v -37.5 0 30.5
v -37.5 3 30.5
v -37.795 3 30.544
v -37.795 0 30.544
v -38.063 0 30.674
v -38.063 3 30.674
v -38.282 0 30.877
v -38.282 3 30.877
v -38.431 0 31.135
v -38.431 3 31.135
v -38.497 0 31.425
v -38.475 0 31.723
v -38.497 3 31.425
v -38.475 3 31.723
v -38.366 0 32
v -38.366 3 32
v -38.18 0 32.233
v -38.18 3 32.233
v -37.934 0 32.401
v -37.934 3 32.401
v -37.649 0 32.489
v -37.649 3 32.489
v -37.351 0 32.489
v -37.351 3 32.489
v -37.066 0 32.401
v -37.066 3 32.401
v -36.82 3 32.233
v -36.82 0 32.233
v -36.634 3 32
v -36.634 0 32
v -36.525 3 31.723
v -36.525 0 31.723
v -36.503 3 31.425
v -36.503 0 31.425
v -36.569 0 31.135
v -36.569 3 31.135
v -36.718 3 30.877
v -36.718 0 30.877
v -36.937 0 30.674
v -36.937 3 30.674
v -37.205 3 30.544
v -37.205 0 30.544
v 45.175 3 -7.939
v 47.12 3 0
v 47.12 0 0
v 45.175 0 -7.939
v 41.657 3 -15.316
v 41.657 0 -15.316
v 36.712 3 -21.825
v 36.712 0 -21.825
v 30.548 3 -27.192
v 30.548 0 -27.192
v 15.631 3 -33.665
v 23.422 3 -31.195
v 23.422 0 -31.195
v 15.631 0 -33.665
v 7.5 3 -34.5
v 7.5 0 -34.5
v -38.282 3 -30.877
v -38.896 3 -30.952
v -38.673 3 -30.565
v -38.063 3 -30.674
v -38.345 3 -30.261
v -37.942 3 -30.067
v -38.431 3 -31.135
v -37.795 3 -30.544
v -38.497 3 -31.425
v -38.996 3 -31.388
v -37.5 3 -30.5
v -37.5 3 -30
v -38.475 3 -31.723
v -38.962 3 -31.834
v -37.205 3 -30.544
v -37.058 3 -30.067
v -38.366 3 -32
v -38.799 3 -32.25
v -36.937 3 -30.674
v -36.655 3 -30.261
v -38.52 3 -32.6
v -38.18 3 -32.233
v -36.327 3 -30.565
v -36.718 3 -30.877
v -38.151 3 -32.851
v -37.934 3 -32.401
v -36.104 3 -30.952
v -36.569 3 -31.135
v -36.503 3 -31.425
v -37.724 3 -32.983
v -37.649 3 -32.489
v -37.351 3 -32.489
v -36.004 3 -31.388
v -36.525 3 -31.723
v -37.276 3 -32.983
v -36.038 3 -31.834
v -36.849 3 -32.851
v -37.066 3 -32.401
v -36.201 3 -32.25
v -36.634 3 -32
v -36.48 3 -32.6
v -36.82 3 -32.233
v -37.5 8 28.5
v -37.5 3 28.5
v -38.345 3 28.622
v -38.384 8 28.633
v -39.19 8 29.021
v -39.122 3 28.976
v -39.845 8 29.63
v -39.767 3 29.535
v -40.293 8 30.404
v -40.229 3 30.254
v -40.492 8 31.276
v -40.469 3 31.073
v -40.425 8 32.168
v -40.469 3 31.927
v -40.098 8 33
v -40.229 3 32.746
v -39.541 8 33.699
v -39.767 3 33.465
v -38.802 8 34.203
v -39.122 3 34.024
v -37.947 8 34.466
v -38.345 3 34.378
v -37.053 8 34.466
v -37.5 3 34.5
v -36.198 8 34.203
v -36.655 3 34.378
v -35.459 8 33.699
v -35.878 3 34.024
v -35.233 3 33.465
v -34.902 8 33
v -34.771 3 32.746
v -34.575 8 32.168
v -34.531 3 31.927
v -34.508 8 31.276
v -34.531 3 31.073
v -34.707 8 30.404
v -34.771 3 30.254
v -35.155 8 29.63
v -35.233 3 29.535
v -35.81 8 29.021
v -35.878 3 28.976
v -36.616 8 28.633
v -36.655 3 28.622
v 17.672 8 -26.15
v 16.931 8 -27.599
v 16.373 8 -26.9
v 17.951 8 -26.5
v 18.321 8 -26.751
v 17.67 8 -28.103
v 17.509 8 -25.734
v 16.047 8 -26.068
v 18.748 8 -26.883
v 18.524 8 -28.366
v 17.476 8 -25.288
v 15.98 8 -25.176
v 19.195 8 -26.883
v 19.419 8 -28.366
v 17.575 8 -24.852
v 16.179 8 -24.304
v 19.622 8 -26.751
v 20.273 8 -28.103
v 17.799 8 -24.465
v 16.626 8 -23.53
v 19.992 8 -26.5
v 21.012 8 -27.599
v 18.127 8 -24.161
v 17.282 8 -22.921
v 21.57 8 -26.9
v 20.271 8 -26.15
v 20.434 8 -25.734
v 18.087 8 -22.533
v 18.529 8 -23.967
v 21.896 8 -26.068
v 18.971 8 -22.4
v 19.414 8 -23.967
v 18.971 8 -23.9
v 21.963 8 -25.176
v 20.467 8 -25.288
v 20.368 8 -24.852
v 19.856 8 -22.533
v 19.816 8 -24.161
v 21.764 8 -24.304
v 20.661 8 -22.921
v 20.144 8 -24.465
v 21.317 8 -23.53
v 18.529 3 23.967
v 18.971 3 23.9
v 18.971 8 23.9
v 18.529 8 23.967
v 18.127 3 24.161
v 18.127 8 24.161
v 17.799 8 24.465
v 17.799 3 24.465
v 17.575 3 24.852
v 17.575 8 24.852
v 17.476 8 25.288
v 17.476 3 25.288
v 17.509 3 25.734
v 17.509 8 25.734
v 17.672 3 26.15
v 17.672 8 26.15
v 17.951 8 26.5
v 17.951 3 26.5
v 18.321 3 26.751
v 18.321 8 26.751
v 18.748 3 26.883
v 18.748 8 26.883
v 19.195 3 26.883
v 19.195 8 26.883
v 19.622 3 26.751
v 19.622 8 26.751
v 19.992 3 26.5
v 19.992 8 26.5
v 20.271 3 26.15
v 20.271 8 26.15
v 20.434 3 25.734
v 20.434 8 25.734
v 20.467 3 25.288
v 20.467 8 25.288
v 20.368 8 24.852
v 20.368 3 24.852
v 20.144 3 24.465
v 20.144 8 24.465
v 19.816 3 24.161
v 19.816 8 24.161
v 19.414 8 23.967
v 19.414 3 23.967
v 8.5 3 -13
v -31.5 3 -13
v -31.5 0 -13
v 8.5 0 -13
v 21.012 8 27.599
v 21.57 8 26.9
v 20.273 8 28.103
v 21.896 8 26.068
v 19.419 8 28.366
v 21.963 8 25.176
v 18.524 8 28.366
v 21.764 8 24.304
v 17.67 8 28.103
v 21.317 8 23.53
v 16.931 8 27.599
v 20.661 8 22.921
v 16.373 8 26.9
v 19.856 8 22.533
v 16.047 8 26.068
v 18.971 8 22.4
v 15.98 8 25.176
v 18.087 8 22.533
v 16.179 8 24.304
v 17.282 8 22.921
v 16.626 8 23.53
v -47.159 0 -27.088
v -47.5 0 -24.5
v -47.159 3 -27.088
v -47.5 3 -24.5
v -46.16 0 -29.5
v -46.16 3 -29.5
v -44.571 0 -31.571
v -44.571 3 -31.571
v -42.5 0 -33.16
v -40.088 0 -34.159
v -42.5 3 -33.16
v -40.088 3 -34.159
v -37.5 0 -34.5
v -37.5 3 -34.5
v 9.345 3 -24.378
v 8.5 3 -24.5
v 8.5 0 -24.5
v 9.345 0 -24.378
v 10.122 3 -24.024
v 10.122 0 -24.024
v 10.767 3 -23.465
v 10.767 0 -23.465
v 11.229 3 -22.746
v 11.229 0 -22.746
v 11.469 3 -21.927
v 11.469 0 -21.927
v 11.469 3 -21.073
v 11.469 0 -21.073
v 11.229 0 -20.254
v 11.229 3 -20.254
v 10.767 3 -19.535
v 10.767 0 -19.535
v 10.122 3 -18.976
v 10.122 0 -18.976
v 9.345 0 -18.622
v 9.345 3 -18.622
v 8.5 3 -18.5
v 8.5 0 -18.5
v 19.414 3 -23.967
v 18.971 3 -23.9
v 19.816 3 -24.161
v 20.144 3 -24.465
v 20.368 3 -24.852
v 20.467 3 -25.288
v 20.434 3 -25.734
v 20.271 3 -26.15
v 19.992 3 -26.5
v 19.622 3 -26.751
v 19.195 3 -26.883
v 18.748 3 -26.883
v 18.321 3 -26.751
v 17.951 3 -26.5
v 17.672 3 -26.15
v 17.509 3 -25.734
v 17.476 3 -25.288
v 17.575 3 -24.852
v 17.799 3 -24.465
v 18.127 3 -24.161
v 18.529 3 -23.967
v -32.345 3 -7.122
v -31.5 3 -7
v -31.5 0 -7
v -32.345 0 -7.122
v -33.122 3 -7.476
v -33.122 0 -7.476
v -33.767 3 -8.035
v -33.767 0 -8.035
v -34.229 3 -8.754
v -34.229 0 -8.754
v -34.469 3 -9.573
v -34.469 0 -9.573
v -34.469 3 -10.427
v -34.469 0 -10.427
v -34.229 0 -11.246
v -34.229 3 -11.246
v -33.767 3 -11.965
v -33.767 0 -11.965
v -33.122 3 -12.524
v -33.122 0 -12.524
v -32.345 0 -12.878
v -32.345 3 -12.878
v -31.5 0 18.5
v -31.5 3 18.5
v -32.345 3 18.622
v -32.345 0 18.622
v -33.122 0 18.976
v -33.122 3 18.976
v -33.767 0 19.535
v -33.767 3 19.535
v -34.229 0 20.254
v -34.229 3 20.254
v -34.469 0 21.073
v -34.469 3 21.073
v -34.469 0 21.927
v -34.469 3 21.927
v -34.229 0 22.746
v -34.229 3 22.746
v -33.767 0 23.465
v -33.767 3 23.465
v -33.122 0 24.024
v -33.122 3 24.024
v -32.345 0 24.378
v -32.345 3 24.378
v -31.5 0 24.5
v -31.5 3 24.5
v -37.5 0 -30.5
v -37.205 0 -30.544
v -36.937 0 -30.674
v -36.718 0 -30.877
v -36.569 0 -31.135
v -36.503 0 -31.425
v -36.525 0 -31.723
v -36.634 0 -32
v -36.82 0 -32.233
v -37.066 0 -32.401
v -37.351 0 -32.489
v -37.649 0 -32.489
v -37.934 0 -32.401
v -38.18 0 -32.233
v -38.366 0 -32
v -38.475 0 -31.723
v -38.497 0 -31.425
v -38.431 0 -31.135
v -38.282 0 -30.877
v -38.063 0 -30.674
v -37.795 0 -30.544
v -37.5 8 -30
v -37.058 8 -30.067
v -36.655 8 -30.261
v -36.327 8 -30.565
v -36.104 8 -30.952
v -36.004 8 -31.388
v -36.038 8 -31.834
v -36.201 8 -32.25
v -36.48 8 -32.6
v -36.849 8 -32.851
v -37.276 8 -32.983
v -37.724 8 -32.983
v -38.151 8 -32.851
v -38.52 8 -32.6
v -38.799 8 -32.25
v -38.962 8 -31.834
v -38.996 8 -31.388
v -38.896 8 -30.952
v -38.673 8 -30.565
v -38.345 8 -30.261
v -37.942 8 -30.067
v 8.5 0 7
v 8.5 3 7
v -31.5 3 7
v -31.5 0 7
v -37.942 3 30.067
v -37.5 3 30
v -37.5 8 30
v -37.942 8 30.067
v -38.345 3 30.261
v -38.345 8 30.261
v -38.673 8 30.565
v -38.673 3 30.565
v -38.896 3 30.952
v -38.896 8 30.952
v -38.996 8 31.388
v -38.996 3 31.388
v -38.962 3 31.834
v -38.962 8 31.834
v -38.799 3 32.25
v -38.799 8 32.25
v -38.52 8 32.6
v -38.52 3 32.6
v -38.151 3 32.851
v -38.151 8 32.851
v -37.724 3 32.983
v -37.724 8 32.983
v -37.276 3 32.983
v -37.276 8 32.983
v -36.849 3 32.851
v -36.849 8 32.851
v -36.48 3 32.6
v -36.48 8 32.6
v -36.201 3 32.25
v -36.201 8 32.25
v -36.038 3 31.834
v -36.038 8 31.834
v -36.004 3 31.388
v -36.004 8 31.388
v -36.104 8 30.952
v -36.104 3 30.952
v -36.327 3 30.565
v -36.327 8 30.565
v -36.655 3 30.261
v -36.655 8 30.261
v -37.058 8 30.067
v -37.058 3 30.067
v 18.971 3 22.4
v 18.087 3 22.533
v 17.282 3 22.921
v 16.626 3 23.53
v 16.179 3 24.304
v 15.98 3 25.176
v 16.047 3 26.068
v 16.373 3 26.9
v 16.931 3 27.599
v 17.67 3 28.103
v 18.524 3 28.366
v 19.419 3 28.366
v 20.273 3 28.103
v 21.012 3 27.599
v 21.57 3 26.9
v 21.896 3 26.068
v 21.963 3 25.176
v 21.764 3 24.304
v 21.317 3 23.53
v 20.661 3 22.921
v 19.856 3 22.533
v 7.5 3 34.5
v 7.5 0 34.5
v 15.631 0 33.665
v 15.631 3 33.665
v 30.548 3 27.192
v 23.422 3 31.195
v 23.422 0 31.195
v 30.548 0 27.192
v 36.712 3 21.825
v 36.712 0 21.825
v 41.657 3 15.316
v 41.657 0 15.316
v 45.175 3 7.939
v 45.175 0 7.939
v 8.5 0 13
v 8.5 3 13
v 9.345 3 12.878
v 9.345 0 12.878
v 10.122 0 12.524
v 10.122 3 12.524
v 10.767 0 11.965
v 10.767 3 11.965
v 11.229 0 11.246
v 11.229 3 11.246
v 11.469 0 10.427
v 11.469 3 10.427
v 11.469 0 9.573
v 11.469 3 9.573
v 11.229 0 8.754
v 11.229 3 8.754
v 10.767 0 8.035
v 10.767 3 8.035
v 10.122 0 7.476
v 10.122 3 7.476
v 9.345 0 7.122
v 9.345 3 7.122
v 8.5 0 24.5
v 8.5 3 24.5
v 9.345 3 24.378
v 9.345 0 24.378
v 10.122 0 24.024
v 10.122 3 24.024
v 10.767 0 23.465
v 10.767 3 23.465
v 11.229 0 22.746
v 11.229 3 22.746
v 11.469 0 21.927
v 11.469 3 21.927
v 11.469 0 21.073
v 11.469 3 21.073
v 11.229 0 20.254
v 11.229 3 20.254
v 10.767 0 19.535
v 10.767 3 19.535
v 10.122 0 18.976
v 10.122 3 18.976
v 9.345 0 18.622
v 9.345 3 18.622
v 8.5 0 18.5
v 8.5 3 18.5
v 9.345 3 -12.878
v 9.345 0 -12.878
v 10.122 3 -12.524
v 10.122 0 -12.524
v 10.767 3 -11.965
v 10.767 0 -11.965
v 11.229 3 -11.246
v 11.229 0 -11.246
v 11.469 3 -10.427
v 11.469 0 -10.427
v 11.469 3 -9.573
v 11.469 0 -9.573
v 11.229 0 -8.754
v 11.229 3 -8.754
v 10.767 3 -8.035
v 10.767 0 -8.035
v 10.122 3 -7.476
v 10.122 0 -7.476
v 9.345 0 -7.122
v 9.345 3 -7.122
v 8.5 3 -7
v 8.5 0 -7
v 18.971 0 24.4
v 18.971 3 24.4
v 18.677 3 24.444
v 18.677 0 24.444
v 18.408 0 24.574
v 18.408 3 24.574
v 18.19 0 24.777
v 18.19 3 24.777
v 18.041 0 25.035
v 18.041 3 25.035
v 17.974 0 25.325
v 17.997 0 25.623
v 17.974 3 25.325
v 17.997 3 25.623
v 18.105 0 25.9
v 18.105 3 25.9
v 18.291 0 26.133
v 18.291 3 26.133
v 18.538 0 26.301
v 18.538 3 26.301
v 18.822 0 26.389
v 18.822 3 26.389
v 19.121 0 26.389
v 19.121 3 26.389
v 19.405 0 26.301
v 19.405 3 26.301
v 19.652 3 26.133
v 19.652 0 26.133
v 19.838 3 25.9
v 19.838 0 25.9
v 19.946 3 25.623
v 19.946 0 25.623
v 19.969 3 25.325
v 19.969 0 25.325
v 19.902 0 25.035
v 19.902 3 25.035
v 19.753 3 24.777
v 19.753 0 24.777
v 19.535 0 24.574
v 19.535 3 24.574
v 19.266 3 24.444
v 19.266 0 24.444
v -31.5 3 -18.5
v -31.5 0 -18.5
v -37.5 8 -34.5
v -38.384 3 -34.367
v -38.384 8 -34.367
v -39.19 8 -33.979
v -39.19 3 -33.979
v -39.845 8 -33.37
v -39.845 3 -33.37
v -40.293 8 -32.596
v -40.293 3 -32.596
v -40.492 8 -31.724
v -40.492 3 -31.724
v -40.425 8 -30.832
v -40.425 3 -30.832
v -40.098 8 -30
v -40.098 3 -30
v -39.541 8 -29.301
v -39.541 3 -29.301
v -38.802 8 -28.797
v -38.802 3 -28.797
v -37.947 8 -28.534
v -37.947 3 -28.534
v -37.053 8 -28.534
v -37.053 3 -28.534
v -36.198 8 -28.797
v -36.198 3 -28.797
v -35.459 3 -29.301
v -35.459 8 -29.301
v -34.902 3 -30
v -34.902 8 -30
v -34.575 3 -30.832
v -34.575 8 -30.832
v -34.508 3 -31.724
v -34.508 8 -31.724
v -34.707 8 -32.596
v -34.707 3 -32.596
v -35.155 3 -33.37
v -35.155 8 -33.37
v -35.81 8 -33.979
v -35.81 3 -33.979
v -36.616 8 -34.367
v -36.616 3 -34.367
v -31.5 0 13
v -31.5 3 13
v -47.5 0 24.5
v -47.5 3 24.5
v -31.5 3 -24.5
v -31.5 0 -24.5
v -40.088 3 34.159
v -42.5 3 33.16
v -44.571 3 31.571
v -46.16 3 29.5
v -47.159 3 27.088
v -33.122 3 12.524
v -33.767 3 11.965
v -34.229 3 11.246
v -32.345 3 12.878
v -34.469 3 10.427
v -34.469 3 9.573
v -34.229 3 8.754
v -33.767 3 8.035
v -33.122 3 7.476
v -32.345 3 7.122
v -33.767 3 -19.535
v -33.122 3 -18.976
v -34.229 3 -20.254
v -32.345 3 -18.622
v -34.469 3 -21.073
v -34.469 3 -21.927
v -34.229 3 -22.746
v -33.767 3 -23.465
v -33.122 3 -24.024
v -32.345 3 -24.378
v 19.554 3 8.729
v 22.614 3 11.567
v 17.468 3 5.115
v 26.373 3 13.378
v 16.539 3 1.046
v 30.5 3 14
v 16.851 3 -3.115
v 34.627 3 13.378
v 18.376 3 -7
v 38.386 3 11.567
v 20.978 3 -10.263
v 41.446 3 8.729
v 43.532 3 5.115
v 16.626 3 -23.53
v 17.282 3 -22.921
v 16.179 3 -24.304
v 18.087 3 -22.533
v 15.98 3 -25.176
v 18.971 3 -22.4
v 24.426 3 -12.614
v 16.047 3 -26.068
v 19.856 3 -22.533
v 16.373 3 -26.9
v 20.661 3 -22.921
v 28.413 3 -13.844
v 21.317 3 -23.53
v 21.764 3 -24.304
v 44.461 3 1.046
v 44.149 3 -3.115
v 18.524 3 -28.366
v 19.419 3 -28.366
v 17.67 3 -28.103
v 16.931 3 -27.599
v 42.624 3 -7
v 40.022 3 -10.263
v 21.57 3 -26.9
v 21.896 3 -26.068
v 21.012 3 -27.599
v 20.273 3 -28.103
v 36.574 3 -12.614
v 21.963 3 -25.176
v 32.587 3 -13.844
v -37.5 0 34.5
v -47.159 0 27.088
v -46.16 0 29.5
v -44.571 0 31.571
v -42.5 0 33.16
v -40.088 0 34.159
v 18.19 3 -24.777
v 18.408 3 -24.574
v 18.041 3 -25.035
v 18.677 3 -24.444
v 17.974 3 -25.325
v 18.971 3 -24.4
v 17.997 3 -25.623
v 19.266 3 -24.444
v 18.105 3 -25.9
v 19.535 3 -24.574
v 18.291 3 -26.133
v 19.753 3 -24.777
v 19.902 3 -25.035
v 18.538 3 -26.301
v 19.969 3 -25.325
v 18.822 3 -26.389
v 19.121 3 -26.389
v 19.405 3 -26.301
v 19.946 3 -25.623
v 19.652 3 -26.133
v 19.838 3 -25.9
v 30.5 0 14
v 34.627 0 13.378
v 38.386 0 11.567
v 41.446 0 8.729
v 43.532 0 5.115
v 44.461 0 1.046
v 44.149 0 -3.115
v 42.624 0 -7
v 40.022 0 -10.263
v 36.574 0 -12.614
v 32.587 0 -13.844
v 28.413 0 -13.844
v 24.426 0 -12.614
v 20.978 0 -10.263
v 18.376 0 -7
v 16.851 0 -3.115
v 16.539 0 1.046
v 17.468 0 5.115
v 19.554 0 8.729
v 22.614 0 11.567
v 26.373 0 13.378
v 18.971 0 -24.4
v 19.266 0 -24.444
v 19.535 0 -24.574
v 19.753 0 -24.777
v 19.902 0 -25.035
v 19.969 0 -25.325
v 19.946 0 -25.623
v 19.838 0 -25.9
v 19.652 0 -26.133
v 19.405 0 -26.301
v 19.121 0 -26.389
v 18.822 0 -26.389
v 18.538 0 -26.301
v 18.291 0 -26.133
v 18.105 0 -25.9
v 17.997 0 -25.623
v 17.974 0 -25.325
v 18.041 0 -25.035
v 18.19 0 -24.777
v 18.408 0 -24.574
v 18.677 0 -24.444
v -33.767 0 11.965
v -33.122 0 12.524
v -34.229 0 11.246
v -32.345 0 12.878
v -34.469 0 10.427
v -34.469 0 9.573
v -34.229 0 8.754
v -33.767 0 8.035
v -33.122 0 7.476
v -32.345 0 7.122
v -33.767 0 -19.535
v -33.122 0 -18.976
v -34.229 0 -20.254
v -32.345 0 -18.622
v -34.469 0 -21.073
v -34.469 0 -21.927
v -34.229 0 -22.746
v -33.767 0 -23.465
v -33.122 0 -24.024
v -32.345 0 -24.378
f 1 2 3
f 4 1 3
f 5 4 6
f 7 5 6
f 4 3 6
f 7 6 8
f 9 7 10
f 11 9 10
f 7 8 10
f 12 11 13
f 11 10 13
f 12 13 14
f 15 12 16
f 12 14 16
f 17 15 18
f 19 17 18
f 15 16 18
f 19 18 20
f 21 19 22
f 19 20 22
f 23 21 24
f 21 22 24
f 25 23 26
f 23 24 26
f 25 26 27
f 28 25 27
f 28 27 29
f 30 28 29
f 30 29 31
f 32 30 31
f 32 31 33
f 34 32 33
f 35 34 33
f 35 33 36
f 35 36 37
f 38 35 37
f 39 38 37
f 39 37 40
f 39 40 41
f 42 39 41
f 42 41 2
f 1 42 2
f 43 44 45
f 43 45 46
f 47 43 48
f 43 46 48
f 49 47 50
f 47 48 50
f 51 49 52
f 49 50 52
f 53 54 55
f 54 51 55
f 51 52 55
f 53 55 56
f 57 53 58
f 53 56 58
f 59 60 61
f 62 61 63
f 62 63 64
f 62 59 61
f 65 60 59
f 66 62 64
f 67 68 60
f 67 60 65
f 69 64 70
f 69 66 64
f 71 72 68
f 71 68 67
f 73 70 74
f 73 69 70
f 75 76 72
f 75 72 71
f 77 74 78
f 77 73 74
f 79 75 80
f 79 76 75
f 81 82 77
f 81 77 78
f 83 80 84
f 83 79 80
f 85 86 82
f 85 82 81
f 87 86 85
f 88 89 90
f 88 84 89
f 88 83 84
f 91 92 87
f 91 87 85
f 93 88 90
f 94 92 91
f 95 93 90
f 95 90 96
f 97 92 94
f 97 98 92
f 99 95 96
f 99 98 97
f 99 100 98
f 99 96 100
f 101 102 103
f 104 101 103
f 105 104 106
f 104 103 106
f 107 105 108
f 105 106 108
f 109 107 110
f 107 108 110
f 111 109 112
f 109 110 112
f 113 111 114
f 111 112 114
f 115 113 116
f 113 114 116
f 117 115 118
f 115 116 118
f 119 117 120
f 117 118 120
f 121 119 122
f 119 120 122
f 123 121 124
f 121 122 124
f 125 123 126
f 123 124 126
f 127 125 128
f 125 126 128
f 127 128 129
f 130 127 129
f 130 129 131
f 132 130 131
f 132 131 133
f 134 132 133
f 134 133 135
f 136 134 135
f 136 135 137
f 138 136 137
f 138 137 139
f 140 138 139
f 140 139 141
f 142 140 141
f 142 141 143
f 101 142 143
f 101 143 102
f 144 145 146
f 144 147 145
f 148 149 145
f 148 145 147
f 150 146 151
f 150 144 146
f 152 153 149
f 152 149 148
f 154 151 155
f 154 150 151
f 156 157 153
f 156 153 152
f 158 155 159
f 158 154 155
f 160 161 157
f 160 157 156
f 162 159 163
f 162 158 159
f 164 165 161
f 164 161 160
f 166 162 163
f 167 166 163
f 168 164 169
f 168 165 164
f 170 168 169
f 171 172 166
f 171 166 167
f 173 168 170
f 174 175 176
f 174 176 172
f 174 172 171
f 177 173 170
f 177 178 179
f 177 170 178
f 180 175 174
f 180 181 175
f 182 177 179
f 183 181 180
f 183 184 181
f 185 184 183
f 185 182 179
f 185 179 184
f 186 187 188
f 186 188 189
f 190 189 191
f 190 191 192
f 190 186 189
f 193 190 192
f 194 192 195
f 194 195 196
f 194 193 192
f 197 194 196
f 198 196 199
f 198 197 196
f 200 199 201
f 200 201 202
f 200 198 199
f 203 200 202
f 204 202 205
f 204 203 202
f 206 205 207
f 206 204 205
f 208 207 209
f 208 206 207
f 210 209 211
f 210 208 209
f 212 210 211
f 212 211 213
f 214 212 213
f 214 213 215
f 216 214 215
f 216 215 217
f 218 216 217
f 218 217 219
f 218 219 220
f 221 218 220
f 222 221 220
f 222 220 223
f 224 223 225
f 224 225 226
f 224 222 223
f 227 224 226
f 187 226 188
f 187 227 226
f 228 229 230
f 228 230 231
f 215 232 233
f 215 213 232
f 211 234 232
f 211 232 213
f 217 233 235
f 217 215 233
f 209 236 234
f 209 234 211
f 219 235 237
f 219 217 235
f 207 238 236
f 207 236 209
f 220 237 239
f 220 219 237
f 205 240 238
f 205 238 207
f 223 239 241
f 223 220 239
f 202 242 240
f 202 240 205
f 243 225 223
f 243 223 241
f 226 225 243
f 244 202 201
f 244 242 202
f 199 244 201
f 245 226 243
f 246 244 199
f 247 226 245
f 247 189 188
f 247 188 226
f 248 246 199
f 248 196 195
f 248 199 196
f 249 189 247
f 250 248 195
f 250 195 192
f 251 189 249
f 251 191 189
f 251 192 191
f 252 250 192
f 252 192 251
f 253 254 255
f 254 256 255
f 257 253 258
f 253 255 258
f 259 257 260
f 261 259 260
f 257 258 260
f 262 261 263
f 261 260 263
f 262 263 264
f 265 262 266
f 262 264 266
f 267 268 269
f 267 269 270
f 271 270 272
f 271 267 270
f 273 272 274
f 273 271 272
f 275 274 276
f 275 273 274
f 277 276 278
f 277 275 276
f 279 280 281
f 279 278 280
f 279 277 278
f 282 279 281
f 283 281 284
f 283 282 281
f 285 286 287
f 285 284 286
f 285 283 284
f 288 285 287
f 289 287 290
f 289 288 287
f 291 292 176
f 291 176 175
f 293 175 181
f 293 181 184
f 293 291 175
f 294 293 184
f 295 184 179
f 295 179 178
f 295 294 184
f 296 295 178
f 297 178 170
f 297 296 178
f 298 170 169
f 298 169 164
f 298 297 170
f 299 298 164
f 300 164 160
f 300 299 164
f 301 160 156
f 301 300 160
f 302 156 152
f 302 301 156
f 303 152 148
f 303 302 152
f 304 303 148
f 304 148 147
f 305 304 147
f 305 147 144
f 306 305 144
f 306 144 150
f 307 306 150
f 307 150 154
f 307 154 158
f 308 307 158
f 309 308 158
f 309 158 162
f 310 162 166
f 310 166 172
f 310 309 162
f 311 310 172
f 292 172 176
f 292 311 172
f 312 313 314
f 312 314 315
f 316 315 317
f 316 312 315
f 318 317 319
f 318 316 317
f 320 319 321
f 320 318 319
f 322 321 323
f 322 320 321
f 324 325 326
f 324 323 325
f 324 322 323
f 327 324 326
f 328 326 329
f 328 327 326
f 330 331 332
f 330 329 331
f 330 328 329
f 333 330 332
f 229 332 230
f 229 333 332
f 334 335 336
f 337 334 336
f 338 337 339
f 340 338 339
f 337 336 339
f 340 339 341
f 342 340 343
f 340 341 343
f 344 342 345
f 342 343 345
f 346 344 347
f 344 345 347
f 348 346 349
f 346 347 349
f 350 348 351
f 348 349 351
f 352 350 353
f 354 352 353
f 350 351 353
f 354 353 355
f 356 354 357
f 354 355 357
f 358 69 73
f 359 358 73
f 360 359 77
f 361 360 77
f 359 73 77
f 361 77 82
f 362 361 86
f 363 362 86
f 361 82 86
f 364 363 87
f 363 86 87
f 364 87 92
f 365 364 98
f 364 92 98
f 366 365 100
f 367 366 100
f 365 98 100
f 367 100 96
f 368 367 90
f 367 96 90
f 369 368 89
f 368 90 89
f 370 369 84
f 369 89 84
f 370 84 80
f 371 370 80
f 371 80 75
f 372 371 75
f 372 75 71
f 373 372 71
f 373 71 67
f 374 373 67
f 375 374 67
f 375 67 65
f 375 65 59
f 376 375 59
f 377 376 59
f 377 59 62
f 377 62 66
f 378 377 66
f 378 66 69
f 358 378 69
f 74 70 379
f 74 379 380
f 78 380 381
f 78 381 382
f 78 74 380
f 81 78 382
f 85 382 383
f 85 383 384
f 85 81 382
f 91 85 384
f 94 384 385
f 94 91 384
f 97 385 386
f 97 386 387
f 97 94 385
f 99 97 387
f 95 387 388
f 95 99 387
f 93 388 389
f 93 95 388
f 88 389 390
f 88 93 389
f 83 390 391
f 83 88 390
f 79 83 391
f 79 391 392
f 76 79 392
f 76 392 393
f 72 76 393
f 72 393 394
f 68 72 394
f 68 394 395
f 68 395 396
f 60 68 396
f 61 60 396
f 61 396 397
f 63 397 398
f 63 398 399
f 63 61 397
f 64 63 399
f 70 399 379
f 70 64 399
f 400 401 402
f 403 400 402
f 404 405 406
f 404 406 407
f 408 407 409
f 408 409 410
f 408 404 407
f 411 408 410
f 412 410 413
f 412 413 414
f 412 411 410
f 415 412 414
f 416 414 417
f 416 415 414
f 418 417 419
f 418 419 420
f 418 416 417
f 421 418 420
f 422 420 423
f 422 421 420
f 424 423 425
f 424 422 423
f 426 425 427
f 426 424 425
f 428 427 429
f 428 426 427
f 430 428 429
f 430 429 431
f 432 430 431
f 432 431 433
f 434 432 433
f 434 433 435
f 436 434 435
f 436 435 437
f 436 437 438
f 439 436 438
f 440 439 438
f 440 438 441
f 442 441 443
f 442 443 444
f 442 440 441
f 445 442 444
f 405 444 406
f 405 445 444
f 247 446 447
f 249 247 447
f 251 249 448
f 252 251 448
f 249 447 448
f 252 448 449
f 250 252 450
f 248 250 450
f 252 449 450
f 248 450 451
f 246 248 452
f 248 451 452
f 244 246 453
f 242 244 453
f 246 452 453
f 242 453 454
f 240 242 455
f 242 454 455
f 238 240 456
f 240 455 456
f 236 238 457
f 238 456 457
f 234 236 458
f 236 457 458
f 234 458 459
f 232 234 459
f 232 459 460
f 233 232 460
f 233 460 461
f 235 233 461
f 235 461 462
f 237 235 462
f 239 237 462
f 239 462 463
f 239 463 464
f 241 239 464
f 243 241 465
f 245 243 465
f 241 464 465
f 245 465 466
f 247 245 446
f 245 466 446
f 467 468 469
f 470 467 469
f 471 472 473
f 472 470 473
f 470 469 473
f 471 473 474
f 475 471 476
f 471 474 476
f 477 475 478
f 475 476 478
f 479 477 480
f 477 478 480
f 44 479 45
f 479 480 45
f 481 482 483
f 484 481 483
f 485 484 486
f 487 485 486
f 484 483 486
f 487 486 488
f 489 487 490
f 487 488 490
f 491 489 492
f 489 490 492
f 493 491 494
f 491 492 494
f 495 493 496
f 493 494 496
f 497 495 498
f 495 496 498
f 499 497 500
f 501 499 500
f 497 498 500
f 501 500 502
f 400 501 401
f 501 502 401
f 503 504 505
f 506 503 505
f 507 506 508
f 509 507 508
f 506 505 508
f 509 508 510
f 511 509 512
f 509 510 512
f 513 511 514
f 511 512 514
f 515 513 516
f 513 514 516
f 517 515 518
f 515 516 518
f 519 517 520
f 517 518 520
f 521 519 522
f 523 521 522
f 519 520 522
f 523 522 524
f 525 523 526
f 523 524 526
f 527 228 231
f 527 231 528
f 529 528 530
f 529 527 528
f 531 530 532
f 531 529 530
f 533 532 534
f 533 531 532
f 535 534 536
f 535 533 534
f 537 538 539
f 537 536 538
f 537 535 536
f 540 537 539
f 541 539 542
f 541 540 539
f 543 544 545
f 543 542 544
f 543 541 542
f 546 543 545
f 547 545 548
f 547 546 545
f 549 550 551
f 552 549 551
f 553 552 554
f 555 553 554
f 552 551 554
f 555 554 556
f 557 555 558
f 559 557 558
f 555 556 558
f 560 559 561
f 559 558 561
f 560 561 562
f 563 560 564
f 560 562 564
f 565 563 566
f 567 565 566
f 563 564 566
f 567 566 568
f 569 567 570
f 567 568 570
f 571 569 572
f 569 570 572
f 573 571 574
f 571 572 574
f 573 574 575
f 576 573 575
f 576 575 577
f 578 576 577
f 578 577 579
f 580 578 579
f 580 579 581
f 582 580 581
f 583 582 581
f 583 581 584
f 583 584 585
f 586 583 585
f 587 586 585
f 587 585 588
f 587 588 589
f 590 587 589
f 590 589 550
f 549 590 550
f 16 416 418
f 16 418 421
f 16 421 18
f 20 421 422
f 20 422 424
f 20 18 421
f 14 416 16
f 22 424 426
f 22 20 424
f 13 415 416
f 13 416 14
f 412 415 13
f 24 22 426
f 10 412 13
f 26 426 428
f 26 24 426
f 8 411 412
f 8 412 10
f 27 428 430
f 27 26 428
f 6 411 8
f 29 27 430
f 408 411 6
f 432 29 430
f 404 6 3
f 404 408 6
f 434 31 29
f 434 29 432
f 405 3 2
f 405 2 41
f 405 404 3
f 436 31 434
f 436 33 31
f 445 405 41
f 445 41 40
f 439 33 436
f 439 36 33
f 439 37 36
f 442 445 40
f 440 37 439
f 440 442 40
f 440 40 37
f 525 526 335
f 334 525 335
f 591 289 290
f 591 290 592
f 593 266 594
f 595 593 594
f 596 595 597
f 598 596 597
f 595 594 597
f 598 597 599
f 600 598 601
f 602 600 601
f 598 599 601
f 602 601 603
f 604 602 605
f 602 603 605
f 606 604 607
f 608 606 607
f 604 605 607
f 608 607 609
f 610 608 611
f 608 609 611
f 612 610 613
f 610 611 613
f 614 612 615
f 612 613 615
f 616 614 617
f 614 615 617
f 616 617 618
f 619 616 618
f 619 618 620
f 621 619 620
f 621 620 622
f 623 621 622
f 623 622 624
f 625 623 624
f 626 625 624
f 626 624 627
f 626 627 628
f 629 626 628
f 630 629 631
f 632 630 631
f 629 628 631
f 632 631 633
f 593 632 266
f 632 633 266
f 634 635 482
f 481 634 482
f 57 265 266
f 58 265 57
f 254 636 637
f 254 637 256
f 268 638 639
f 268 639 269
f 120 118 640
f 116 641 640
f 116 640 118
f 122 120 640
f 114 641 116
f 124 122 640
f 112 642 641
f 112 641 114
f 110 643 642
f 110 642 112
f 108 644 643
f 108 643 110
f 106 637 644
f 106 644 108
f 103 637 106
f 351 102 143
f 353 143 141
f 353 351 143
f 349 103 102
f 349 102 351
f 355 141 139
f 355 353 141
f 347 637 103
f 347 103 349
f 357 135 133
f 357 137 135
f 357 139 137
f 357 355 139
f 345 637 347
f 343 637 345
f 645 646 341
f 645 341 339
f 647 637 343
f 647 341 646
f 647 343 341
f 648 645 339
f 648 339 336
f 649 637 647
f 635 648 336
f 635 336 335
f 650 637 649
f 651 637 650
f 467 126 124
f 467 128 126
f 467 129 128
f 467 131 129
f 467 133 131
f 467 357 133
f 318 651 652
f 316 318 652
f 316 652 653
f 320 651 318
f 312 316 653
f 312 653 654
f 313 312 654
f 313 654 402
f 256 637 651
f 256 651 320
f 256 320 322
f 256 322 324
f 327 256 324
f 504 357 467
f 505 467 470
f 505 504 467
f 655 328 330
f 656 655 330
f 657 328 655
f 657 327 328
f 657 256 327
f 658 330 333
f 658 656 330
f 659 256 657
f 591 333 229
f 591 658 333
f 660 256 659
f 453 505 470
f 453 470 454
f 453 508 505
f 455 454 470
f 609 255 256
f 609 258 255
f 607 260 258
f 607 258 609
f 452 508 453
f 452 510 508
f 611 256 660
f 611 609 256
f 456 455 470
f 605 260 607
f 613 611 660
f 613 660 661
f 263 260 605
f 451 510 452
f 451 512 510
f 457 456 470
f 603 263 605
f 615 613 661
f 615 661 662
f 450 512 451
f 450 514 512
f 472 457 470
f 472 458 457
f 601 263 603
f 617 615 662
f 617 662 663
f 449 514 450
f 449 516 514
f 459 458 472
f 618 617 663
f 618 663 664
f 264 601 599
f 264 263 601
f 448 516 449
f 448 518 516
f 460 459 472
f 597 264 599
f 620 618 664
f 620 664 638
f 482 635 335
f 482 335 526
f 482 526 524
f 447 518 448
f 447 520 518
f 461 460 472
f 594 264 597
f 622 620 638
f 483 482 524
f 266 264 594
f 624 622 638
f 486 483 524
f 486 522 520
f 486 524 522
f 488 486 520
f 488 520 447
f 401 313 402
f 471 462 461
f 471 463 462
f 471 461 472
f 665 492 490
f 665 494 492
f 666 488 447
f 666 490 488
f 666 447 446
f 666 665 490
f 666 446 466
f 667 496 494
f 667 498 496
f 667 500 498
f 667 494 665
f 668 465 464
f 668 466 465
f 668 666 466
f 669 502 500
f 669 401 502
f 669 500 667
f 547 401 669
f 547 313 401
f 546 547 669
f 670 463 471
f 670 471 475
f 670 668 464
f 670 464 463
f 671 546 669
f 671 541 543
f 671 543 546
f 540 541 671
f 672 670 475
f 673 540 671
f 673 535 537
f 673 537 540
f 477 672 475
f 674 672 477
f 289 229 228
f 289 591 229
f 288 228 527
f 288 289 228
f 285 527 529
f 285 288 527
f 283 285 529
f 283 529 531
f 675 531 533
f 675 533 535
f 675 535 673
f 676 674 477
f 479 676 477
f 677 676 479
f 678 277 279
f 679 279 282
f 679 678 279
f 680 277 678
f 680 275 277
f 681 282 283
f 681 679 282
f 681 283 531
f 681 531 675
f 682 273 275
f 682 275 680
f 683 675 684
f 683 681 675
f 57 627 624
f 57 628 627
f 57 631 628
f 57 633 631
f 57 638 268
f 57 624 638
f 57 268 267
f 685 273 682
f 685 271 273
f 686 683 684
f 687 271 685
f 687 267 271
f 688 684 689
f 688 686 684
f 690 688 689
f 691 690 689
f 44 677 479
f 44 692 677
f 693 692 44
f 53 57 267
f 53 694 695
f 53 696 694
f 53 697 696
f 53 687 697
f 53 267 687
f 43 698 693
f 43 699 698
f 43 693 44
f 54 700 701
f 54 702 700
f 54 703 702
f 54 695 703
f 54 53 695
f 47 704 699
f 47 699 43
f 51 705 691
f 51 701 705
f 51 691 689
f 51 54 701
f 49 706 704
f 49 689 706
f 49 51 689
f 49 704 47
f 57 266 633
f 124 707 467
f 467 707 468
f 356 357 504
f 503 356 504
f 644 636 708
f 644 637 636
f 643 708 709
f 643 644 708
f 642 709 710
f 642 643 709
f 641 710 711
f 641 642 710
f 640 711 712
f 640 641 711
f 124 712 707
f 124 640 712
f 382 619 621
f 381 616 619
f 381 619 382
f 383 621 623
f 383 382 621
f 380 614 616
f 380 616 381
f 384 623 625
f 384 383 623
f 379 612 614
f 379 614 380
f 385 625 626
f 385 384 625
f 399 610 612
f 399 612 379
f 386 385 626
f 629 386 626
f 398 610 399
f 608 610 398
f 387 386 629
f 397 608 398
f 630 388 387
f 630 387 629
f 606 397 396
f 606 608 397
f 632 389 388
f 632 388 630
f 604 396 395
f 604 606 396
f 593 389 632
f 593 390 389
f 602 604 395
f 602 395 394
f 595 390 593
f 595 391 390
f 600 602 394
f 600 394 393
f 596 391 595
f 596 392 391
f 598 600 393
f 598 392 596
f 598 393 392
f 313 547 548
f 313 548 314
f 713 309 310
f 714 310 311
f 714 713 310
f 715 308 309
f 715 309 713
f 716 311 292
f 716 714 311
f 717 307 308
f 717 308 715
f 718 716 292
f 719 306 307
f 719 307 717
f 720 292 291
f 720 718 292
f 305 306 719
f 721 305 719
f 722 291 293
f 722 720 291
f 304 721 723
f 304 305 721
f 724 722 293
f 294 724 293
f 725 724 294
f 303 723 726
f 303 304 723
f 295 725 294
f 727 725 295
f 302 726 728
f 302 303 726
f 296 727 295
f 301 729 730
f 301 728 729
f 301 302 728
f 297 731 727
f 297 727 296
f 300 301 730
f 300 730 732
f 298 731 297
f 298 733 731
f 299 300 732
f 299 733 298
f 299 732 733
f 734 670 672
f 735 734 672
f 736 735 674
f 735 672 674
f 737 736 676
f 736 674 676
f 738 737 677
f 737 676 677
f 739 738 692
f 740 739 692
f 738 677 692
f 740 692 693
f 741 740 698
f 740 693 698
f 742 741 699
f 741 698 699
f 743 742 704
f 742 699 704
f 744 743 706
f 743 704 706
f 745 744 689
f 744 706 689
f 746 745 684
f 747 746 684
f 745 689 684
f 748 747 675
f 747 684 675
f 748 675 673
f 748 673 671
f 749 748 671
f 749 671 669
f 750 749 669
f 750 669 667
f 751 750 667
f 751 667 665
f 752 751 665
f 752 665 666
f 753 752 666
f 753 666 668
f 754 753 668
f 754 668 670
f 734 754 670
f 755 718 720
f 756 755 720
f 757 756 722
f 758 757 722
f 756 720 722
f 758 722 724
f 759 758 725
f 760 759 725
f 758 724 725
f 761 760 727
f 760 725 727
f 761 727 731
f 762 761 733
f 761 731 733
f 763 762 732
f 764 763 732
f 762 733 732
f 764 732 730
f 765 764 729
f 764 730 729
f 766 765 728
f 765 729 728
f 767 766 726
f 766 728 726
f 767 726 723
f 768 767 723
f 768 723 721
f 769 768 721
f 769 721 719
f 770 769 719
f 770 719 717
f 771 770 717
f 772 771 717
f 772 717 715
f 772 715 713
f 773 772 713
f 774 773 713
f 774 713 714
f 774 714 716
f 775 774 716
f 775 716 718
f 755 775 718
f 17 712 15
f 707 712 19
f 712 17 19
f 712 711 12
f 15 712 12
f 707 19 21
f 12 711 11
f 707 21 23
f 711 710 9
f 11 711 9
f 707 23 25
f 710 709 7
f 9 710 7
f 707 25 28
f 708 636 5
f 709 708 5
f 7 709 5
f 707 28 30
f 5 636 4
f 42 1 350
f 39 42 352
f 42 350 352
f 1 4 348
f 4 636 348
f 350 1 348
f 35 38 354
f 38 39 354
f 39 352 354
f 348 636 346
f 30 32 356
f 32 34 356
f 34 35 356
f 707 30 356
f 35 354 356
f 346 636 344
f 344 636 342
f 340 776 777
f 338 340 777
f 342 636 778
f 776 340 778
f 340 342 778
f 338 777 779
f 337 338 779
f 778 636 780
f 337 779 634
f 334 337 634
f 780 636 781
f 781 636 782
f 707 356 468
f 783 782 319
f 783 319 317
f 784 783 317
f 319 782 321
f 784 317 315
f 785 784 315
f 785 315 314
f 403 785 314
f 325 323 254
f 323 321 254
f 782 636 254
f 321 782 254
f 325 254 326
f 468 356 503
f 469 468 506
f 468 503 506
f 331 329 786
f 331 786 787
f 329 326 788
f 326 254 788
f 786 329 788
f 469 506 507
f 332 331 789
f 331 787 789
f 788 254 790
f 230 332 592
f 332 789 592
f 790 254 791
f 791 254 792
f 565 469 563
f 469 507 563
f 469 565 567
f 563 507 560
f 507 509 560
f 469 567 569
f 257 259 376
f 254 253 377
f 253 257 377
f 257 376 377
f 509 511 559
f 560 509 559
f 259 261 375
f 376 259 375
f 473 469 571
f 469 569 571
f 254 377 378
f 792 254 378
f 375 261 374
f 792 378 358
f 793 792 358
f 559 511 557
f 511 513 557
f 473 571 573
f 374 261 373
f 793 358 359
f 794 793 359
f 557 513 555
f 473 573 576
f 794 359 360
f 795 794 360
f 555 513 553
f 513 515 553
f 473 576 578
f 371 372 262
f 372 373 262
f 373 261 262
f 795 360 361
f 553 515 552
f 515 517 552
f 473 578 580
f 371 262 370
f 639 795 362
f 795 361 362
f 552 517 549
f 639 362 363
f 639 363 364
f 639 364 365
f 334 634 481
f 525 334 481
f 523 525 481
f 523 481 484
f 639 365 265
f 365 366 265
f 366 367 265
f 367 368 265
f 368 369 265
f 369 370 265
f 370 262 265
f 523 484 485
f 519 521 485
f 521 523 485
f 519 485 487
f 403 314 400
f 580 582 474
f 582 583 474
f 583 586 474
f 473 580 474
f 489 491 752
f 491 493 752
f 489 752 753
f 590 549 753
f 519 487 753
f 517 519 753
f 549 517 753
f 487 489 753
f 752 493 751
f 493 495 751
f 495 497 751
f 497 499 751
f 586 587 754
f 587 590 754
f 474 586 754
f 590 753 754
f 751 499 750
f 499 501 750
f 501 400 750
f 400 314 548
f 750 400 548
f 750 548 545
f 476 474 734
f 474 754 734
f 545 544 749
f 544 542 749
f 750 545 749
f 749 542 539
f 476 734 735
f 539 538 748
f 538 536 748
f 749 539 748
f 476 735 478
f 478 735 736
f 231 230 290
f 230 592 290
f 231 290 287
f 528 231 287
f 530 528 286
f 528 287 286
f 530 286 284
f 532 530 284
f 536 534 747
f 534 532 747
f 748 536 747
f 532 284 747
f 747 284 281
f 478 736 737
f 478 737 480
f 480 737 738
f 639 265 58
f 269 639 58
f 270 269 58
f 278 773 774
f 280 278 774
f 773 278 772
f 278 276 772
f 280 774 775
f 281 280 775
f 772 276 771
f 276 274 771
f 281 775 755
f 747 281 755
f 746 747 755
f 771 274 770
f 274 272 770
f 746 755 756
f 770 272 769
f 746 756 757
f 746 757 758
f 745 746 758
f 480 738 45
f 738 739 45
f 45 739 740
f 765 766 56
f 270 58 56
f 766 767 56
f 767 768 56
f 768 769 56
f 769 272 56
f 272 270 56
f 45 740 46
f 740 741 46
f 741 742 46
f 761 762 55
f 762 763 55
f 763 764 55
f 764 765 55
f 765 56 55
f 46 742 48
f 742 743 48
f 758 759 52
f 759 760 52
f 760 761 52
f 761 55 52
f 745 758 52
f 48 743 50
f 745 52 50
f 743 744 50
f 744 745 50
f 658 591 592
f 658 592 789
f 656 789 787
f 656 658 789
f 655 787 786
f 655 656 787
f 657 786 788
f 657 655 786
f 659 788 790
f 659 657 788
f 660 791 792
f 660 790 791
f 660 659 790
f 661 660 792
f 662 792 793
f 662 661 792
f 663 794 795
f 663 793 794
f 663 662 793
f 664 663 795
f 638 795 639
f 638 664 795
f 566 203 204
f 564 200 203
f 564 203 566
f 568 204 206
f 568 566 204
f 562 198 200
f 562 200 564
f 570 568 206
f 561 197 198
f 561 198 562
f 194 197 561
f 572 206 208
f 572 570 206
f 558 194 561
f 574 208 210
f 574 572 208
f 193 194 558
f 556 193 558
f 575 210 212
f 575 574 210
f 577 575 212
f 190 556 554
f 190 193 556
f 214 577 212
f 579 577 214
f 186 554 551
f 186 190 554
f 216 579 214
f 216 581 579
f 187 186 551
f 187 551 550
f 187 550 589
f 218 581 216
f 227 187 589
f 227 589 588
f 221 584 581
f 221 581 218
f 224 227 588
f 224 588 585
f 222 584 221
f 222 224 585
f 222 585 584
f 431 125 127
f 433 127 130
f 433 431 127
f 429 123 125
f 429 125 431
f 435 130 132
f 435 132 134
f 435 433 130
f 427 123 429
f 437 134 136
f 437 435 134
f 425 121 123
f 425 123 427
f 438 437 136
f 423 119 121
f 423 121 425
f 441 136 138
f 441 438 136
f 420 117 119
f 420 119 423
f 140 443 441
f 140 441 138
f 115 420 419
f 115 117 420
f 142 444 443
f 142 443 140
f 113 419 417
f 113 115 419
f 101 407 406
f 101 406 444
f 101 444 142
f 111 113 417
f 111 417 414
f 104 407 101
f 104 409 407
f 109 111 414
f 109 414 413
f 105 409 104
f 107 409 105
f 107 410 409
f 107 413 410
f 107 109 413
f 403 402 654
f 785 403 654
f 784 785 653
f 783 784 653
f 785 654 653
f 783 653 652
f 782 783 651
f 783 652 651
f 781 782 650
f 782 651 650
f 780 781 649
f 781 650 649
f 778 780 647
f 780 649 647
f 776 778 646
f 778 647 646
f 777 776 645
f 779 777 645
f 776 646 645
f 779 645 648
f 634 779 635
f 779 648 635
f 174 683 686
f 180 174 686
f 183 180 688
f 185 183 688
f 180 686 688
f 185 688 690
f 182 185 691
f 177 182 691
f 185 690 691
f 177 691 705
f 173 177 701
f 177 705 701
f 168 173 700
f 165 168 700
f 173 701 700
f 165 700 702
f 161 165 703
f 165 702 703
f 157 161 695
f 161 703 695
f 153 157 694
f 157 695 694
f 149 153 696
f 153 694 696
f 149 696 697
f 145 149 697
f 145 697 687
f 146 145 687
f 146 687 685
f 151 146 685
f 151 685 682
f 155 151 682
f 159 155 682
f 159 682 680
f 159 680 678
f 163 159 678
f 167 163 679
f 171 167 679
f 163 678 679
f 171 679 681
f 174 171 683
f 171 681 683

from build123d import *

# Parameters (mm, degrees)
ESBO_O1_W                = 95
ESBO_O1_H                = 69
RESSALTO_EXTRUS_O1_DEPTH = 3
ESBO_O2_R                = 14
CORTE_EXTRUS_O1_DEPTH    = 59.783501087
ESBO_O4_R                = 1
CORTE_EXTRUS_O2_DEPTH    = 59.783501087
ESBO_O5_R                = 3
ESBO_O5_R_2              = 1.5
RESSALTO_EXTRUS_O2_DEPTH = 5
FILETE1_R                = 40
FILETE2_R                = 10
CORTE_EXTRUS_O3_DEPTH    = 59.919436521


with BuildPart() as part:
    # Esboço1 → Ressalto-extrusão1 (new body)
    with BuildSketch(Plane(origin=(0, 0, 0), x_dir=(1, 0, 0), z_dir=(0, 1, 0))):
        Rectangle(ESBO_O1_W, ESBO_O1_H)
    extrude(amount=RESSALTO_EXTRUS_O1_DEPTH)

    # Esboço2 → Corte-extrusão1 (cut, through all)
    with BuildSketch(Plane(origin=(0, 3, 0), x_dir=(1, 0, 0), z_dir=(0, 1, 0))):
        with Locations(Location((30.5, 0, 0), (0, 0, 270))):
            Circle(ESBO_O2_R)
    extrude(amount=-CORTE_EXTRUS_O1_DEPTH, mode=Mode.SUBTRACT)

    # Esboço4 → Corte-extrusão2 (cut, through all)
    with BuildSketch(Plane(origin=(0, 3, 0), x_dir=(1, 0, 0), z_dir=(0, 1, 0))):
        with Locations(Location((18.971497235, 25.4, 0), (0, 0, 270))):
            Circle(ESBO_O4_R)
        with Locations(Location((18.971497235, -25.4, 0), (0, 0, 90))):
            Circle(ESBO_O4_R)
        with Locations(Location((-37.5, 31.5, 0), (0, 0, 270))):
            Circle(ESBO_O4_R)
        with Locations(Location((-37.5, -31.5, 0), (0, 0, 90))):
            Circle(ESBO_O4_R)
    extrude(amount=-CORTE_EXTRUS_O2_DEPTH, mode=Mode.SUBTRACT)

    # Esboço5 → Ressalto-extrusão2 (add)
    # profile 1 of 4: a face of its own
    with BuildSketch(Plane(origin=(0, 3, 0), x_dir=(1, 0, 0), z_dir=(0, 1, 0))):
        with Locations(Location((-37.5, 31.5, 0), (0, 0, 90))):
            Circle(ESBO_O5_R)
        with Locations(Location((-37.5, 31.5, 0), (0, 0, 270))):
            Circle(ESBO_O5_R_2, mode=Mode.SUBTRACT)
    # profile 2 of 4: a face of its own
    with BuildSketch(Plane(origin=(0, 3, 0), x_dir=(1, 0, 0), z_dir=(0, 1, 0))):
        with Locations(Location((18.971497235, 25.4, 0), (0, 0, 270))):
            Circle(ESBO_O5_R)
        with Locations(Location((18.971497235, 25.4, 0), (0, 0, 270))):
            Circle(ESBO_O5_R_2, mode=Mode.SUBTRACT)
    # profile 3 of 4: a face of its own
    with BuildSketch(Plane(origin=(0, 3, 0), x_dir=(1, 0, 0), z_dir=(0, 1, 0))):
        with Locations(Location((18.971497235, -25.4, 0), (0, 0, 90))):
            Circle(ESBO_O5_R)
        with Locations(Location((18.971497235, -25.4, 0), (0, 0, 90))):
            Circle(ESBO_O5_R_2, mode=Mode.SUBTRACT)
    # profile 4 of 4: a face of its own
    with BuildSketch(Plane(origin=(0, 3, 0), x_dir=(1, 0, 0), z_dir=(0, 1, 0))):
        with Locations(Location((-37.5, -31.5, 0), (0, 0, 90))):
            Circle(ESBO_O5_R)
        with Locations(Location((-37.5, -31.5, 0), (0, 0, 90))):
            Circle(ESBO_O5_R_2, mode=Mode.SUBTRACT)
    extrude(amount=RESSALTO_EXTRUS_O2_DEPTH)

    # Filete1
    # the kernel refuses this fillet: 40 mm, written as the material it takes off along each edge
    with BuildSketch(Plane(origin=(47.5, -100, -34.5), x_dir=(0, 0, 1), z_dir=(0, 1, 0)), Plane(origin=(47.5, -100, 34.5), x_dir=(-1, 0, 0), z_dir=(0, 1, 0))) as filete1_piece_1:
        with BuildLine():
            CenterArc((FILETE1_R, -FILETE1_R), FILETE1_R, 90, 90)
            Line((0, -FILETE1_R), (0, 0))
            Line((0, 0), (FILETE1_R, 0))
        make_face()
    extrude(amount=203, mode=Mode.SUBTRACT)

    # Filete2
    filete2_edges = [part.edges().sort_by_distance(p)[0] for p in [
        (-47.5, 1.5, 34.5),
        (-47.5, 1.5, -34.5),
    ]]
    fillet(filete2_edges, radius=FILETE2_R)

    # Esboço7 → Corte-extrusão3 (cut, through all)
    with BuildSketch(Plane(origin=(0, 3, 0), x_dir=(1, 0, 0), z_dir=(0, 1, 0))):
        with BuildLine():
            Line((-31.5, 13), (8.5, 13))
            ThreePointArc((8.5, 13), (11.5, 10), (8.5, 7))
            Line((8.5, 7), (-31.5, 7))
            ThreePointArc((-31.5, 7), (-34.5, 10), (-31.5, 13))
        make_face()
        with BuildLine():
            Line((-31.5, 24.5), (8.5, 24.5))
            ThreePointArc((8.5, 24.5), (11.5, 21.5), (8.5, 18.5))
            Line((8.5, 18.5), (-31.5, 18.5))
            ThreePointArc((-31.5, 18.5), (-34.5, 21.5), (-31.5, 24.5))
        make_face()
        with BuildLine():
            Line((-31.5, -24.5), (8.5, -24.5))
            ThreePointArc((8.5, -24.5), (11.5, -21.5), (8.5, -18.5))
            Line((8.5, -18.5), (-31.5, -18.5))
            ThreePointArc((-31.5, -18.5), (-34.5, -21.5), (-31.5, -24.5))
        make_face()
        with BuildLine():
            Line((-31.5, -13), (8.5, -13))
            ThreePointArc((8.5, -13), (11.5, -10), (8.5, -7))
            Line((8.5, -7), (-31.5, -7))
            ThreePointArc((-31.5, -7), (-34.5, -10), (-31.5, -13))
        make_face()
    extrude(amount=-CORTE_EXTRUS_O3_DEPTH, mode=Mode.SUBTRACT)


solid = part.part
